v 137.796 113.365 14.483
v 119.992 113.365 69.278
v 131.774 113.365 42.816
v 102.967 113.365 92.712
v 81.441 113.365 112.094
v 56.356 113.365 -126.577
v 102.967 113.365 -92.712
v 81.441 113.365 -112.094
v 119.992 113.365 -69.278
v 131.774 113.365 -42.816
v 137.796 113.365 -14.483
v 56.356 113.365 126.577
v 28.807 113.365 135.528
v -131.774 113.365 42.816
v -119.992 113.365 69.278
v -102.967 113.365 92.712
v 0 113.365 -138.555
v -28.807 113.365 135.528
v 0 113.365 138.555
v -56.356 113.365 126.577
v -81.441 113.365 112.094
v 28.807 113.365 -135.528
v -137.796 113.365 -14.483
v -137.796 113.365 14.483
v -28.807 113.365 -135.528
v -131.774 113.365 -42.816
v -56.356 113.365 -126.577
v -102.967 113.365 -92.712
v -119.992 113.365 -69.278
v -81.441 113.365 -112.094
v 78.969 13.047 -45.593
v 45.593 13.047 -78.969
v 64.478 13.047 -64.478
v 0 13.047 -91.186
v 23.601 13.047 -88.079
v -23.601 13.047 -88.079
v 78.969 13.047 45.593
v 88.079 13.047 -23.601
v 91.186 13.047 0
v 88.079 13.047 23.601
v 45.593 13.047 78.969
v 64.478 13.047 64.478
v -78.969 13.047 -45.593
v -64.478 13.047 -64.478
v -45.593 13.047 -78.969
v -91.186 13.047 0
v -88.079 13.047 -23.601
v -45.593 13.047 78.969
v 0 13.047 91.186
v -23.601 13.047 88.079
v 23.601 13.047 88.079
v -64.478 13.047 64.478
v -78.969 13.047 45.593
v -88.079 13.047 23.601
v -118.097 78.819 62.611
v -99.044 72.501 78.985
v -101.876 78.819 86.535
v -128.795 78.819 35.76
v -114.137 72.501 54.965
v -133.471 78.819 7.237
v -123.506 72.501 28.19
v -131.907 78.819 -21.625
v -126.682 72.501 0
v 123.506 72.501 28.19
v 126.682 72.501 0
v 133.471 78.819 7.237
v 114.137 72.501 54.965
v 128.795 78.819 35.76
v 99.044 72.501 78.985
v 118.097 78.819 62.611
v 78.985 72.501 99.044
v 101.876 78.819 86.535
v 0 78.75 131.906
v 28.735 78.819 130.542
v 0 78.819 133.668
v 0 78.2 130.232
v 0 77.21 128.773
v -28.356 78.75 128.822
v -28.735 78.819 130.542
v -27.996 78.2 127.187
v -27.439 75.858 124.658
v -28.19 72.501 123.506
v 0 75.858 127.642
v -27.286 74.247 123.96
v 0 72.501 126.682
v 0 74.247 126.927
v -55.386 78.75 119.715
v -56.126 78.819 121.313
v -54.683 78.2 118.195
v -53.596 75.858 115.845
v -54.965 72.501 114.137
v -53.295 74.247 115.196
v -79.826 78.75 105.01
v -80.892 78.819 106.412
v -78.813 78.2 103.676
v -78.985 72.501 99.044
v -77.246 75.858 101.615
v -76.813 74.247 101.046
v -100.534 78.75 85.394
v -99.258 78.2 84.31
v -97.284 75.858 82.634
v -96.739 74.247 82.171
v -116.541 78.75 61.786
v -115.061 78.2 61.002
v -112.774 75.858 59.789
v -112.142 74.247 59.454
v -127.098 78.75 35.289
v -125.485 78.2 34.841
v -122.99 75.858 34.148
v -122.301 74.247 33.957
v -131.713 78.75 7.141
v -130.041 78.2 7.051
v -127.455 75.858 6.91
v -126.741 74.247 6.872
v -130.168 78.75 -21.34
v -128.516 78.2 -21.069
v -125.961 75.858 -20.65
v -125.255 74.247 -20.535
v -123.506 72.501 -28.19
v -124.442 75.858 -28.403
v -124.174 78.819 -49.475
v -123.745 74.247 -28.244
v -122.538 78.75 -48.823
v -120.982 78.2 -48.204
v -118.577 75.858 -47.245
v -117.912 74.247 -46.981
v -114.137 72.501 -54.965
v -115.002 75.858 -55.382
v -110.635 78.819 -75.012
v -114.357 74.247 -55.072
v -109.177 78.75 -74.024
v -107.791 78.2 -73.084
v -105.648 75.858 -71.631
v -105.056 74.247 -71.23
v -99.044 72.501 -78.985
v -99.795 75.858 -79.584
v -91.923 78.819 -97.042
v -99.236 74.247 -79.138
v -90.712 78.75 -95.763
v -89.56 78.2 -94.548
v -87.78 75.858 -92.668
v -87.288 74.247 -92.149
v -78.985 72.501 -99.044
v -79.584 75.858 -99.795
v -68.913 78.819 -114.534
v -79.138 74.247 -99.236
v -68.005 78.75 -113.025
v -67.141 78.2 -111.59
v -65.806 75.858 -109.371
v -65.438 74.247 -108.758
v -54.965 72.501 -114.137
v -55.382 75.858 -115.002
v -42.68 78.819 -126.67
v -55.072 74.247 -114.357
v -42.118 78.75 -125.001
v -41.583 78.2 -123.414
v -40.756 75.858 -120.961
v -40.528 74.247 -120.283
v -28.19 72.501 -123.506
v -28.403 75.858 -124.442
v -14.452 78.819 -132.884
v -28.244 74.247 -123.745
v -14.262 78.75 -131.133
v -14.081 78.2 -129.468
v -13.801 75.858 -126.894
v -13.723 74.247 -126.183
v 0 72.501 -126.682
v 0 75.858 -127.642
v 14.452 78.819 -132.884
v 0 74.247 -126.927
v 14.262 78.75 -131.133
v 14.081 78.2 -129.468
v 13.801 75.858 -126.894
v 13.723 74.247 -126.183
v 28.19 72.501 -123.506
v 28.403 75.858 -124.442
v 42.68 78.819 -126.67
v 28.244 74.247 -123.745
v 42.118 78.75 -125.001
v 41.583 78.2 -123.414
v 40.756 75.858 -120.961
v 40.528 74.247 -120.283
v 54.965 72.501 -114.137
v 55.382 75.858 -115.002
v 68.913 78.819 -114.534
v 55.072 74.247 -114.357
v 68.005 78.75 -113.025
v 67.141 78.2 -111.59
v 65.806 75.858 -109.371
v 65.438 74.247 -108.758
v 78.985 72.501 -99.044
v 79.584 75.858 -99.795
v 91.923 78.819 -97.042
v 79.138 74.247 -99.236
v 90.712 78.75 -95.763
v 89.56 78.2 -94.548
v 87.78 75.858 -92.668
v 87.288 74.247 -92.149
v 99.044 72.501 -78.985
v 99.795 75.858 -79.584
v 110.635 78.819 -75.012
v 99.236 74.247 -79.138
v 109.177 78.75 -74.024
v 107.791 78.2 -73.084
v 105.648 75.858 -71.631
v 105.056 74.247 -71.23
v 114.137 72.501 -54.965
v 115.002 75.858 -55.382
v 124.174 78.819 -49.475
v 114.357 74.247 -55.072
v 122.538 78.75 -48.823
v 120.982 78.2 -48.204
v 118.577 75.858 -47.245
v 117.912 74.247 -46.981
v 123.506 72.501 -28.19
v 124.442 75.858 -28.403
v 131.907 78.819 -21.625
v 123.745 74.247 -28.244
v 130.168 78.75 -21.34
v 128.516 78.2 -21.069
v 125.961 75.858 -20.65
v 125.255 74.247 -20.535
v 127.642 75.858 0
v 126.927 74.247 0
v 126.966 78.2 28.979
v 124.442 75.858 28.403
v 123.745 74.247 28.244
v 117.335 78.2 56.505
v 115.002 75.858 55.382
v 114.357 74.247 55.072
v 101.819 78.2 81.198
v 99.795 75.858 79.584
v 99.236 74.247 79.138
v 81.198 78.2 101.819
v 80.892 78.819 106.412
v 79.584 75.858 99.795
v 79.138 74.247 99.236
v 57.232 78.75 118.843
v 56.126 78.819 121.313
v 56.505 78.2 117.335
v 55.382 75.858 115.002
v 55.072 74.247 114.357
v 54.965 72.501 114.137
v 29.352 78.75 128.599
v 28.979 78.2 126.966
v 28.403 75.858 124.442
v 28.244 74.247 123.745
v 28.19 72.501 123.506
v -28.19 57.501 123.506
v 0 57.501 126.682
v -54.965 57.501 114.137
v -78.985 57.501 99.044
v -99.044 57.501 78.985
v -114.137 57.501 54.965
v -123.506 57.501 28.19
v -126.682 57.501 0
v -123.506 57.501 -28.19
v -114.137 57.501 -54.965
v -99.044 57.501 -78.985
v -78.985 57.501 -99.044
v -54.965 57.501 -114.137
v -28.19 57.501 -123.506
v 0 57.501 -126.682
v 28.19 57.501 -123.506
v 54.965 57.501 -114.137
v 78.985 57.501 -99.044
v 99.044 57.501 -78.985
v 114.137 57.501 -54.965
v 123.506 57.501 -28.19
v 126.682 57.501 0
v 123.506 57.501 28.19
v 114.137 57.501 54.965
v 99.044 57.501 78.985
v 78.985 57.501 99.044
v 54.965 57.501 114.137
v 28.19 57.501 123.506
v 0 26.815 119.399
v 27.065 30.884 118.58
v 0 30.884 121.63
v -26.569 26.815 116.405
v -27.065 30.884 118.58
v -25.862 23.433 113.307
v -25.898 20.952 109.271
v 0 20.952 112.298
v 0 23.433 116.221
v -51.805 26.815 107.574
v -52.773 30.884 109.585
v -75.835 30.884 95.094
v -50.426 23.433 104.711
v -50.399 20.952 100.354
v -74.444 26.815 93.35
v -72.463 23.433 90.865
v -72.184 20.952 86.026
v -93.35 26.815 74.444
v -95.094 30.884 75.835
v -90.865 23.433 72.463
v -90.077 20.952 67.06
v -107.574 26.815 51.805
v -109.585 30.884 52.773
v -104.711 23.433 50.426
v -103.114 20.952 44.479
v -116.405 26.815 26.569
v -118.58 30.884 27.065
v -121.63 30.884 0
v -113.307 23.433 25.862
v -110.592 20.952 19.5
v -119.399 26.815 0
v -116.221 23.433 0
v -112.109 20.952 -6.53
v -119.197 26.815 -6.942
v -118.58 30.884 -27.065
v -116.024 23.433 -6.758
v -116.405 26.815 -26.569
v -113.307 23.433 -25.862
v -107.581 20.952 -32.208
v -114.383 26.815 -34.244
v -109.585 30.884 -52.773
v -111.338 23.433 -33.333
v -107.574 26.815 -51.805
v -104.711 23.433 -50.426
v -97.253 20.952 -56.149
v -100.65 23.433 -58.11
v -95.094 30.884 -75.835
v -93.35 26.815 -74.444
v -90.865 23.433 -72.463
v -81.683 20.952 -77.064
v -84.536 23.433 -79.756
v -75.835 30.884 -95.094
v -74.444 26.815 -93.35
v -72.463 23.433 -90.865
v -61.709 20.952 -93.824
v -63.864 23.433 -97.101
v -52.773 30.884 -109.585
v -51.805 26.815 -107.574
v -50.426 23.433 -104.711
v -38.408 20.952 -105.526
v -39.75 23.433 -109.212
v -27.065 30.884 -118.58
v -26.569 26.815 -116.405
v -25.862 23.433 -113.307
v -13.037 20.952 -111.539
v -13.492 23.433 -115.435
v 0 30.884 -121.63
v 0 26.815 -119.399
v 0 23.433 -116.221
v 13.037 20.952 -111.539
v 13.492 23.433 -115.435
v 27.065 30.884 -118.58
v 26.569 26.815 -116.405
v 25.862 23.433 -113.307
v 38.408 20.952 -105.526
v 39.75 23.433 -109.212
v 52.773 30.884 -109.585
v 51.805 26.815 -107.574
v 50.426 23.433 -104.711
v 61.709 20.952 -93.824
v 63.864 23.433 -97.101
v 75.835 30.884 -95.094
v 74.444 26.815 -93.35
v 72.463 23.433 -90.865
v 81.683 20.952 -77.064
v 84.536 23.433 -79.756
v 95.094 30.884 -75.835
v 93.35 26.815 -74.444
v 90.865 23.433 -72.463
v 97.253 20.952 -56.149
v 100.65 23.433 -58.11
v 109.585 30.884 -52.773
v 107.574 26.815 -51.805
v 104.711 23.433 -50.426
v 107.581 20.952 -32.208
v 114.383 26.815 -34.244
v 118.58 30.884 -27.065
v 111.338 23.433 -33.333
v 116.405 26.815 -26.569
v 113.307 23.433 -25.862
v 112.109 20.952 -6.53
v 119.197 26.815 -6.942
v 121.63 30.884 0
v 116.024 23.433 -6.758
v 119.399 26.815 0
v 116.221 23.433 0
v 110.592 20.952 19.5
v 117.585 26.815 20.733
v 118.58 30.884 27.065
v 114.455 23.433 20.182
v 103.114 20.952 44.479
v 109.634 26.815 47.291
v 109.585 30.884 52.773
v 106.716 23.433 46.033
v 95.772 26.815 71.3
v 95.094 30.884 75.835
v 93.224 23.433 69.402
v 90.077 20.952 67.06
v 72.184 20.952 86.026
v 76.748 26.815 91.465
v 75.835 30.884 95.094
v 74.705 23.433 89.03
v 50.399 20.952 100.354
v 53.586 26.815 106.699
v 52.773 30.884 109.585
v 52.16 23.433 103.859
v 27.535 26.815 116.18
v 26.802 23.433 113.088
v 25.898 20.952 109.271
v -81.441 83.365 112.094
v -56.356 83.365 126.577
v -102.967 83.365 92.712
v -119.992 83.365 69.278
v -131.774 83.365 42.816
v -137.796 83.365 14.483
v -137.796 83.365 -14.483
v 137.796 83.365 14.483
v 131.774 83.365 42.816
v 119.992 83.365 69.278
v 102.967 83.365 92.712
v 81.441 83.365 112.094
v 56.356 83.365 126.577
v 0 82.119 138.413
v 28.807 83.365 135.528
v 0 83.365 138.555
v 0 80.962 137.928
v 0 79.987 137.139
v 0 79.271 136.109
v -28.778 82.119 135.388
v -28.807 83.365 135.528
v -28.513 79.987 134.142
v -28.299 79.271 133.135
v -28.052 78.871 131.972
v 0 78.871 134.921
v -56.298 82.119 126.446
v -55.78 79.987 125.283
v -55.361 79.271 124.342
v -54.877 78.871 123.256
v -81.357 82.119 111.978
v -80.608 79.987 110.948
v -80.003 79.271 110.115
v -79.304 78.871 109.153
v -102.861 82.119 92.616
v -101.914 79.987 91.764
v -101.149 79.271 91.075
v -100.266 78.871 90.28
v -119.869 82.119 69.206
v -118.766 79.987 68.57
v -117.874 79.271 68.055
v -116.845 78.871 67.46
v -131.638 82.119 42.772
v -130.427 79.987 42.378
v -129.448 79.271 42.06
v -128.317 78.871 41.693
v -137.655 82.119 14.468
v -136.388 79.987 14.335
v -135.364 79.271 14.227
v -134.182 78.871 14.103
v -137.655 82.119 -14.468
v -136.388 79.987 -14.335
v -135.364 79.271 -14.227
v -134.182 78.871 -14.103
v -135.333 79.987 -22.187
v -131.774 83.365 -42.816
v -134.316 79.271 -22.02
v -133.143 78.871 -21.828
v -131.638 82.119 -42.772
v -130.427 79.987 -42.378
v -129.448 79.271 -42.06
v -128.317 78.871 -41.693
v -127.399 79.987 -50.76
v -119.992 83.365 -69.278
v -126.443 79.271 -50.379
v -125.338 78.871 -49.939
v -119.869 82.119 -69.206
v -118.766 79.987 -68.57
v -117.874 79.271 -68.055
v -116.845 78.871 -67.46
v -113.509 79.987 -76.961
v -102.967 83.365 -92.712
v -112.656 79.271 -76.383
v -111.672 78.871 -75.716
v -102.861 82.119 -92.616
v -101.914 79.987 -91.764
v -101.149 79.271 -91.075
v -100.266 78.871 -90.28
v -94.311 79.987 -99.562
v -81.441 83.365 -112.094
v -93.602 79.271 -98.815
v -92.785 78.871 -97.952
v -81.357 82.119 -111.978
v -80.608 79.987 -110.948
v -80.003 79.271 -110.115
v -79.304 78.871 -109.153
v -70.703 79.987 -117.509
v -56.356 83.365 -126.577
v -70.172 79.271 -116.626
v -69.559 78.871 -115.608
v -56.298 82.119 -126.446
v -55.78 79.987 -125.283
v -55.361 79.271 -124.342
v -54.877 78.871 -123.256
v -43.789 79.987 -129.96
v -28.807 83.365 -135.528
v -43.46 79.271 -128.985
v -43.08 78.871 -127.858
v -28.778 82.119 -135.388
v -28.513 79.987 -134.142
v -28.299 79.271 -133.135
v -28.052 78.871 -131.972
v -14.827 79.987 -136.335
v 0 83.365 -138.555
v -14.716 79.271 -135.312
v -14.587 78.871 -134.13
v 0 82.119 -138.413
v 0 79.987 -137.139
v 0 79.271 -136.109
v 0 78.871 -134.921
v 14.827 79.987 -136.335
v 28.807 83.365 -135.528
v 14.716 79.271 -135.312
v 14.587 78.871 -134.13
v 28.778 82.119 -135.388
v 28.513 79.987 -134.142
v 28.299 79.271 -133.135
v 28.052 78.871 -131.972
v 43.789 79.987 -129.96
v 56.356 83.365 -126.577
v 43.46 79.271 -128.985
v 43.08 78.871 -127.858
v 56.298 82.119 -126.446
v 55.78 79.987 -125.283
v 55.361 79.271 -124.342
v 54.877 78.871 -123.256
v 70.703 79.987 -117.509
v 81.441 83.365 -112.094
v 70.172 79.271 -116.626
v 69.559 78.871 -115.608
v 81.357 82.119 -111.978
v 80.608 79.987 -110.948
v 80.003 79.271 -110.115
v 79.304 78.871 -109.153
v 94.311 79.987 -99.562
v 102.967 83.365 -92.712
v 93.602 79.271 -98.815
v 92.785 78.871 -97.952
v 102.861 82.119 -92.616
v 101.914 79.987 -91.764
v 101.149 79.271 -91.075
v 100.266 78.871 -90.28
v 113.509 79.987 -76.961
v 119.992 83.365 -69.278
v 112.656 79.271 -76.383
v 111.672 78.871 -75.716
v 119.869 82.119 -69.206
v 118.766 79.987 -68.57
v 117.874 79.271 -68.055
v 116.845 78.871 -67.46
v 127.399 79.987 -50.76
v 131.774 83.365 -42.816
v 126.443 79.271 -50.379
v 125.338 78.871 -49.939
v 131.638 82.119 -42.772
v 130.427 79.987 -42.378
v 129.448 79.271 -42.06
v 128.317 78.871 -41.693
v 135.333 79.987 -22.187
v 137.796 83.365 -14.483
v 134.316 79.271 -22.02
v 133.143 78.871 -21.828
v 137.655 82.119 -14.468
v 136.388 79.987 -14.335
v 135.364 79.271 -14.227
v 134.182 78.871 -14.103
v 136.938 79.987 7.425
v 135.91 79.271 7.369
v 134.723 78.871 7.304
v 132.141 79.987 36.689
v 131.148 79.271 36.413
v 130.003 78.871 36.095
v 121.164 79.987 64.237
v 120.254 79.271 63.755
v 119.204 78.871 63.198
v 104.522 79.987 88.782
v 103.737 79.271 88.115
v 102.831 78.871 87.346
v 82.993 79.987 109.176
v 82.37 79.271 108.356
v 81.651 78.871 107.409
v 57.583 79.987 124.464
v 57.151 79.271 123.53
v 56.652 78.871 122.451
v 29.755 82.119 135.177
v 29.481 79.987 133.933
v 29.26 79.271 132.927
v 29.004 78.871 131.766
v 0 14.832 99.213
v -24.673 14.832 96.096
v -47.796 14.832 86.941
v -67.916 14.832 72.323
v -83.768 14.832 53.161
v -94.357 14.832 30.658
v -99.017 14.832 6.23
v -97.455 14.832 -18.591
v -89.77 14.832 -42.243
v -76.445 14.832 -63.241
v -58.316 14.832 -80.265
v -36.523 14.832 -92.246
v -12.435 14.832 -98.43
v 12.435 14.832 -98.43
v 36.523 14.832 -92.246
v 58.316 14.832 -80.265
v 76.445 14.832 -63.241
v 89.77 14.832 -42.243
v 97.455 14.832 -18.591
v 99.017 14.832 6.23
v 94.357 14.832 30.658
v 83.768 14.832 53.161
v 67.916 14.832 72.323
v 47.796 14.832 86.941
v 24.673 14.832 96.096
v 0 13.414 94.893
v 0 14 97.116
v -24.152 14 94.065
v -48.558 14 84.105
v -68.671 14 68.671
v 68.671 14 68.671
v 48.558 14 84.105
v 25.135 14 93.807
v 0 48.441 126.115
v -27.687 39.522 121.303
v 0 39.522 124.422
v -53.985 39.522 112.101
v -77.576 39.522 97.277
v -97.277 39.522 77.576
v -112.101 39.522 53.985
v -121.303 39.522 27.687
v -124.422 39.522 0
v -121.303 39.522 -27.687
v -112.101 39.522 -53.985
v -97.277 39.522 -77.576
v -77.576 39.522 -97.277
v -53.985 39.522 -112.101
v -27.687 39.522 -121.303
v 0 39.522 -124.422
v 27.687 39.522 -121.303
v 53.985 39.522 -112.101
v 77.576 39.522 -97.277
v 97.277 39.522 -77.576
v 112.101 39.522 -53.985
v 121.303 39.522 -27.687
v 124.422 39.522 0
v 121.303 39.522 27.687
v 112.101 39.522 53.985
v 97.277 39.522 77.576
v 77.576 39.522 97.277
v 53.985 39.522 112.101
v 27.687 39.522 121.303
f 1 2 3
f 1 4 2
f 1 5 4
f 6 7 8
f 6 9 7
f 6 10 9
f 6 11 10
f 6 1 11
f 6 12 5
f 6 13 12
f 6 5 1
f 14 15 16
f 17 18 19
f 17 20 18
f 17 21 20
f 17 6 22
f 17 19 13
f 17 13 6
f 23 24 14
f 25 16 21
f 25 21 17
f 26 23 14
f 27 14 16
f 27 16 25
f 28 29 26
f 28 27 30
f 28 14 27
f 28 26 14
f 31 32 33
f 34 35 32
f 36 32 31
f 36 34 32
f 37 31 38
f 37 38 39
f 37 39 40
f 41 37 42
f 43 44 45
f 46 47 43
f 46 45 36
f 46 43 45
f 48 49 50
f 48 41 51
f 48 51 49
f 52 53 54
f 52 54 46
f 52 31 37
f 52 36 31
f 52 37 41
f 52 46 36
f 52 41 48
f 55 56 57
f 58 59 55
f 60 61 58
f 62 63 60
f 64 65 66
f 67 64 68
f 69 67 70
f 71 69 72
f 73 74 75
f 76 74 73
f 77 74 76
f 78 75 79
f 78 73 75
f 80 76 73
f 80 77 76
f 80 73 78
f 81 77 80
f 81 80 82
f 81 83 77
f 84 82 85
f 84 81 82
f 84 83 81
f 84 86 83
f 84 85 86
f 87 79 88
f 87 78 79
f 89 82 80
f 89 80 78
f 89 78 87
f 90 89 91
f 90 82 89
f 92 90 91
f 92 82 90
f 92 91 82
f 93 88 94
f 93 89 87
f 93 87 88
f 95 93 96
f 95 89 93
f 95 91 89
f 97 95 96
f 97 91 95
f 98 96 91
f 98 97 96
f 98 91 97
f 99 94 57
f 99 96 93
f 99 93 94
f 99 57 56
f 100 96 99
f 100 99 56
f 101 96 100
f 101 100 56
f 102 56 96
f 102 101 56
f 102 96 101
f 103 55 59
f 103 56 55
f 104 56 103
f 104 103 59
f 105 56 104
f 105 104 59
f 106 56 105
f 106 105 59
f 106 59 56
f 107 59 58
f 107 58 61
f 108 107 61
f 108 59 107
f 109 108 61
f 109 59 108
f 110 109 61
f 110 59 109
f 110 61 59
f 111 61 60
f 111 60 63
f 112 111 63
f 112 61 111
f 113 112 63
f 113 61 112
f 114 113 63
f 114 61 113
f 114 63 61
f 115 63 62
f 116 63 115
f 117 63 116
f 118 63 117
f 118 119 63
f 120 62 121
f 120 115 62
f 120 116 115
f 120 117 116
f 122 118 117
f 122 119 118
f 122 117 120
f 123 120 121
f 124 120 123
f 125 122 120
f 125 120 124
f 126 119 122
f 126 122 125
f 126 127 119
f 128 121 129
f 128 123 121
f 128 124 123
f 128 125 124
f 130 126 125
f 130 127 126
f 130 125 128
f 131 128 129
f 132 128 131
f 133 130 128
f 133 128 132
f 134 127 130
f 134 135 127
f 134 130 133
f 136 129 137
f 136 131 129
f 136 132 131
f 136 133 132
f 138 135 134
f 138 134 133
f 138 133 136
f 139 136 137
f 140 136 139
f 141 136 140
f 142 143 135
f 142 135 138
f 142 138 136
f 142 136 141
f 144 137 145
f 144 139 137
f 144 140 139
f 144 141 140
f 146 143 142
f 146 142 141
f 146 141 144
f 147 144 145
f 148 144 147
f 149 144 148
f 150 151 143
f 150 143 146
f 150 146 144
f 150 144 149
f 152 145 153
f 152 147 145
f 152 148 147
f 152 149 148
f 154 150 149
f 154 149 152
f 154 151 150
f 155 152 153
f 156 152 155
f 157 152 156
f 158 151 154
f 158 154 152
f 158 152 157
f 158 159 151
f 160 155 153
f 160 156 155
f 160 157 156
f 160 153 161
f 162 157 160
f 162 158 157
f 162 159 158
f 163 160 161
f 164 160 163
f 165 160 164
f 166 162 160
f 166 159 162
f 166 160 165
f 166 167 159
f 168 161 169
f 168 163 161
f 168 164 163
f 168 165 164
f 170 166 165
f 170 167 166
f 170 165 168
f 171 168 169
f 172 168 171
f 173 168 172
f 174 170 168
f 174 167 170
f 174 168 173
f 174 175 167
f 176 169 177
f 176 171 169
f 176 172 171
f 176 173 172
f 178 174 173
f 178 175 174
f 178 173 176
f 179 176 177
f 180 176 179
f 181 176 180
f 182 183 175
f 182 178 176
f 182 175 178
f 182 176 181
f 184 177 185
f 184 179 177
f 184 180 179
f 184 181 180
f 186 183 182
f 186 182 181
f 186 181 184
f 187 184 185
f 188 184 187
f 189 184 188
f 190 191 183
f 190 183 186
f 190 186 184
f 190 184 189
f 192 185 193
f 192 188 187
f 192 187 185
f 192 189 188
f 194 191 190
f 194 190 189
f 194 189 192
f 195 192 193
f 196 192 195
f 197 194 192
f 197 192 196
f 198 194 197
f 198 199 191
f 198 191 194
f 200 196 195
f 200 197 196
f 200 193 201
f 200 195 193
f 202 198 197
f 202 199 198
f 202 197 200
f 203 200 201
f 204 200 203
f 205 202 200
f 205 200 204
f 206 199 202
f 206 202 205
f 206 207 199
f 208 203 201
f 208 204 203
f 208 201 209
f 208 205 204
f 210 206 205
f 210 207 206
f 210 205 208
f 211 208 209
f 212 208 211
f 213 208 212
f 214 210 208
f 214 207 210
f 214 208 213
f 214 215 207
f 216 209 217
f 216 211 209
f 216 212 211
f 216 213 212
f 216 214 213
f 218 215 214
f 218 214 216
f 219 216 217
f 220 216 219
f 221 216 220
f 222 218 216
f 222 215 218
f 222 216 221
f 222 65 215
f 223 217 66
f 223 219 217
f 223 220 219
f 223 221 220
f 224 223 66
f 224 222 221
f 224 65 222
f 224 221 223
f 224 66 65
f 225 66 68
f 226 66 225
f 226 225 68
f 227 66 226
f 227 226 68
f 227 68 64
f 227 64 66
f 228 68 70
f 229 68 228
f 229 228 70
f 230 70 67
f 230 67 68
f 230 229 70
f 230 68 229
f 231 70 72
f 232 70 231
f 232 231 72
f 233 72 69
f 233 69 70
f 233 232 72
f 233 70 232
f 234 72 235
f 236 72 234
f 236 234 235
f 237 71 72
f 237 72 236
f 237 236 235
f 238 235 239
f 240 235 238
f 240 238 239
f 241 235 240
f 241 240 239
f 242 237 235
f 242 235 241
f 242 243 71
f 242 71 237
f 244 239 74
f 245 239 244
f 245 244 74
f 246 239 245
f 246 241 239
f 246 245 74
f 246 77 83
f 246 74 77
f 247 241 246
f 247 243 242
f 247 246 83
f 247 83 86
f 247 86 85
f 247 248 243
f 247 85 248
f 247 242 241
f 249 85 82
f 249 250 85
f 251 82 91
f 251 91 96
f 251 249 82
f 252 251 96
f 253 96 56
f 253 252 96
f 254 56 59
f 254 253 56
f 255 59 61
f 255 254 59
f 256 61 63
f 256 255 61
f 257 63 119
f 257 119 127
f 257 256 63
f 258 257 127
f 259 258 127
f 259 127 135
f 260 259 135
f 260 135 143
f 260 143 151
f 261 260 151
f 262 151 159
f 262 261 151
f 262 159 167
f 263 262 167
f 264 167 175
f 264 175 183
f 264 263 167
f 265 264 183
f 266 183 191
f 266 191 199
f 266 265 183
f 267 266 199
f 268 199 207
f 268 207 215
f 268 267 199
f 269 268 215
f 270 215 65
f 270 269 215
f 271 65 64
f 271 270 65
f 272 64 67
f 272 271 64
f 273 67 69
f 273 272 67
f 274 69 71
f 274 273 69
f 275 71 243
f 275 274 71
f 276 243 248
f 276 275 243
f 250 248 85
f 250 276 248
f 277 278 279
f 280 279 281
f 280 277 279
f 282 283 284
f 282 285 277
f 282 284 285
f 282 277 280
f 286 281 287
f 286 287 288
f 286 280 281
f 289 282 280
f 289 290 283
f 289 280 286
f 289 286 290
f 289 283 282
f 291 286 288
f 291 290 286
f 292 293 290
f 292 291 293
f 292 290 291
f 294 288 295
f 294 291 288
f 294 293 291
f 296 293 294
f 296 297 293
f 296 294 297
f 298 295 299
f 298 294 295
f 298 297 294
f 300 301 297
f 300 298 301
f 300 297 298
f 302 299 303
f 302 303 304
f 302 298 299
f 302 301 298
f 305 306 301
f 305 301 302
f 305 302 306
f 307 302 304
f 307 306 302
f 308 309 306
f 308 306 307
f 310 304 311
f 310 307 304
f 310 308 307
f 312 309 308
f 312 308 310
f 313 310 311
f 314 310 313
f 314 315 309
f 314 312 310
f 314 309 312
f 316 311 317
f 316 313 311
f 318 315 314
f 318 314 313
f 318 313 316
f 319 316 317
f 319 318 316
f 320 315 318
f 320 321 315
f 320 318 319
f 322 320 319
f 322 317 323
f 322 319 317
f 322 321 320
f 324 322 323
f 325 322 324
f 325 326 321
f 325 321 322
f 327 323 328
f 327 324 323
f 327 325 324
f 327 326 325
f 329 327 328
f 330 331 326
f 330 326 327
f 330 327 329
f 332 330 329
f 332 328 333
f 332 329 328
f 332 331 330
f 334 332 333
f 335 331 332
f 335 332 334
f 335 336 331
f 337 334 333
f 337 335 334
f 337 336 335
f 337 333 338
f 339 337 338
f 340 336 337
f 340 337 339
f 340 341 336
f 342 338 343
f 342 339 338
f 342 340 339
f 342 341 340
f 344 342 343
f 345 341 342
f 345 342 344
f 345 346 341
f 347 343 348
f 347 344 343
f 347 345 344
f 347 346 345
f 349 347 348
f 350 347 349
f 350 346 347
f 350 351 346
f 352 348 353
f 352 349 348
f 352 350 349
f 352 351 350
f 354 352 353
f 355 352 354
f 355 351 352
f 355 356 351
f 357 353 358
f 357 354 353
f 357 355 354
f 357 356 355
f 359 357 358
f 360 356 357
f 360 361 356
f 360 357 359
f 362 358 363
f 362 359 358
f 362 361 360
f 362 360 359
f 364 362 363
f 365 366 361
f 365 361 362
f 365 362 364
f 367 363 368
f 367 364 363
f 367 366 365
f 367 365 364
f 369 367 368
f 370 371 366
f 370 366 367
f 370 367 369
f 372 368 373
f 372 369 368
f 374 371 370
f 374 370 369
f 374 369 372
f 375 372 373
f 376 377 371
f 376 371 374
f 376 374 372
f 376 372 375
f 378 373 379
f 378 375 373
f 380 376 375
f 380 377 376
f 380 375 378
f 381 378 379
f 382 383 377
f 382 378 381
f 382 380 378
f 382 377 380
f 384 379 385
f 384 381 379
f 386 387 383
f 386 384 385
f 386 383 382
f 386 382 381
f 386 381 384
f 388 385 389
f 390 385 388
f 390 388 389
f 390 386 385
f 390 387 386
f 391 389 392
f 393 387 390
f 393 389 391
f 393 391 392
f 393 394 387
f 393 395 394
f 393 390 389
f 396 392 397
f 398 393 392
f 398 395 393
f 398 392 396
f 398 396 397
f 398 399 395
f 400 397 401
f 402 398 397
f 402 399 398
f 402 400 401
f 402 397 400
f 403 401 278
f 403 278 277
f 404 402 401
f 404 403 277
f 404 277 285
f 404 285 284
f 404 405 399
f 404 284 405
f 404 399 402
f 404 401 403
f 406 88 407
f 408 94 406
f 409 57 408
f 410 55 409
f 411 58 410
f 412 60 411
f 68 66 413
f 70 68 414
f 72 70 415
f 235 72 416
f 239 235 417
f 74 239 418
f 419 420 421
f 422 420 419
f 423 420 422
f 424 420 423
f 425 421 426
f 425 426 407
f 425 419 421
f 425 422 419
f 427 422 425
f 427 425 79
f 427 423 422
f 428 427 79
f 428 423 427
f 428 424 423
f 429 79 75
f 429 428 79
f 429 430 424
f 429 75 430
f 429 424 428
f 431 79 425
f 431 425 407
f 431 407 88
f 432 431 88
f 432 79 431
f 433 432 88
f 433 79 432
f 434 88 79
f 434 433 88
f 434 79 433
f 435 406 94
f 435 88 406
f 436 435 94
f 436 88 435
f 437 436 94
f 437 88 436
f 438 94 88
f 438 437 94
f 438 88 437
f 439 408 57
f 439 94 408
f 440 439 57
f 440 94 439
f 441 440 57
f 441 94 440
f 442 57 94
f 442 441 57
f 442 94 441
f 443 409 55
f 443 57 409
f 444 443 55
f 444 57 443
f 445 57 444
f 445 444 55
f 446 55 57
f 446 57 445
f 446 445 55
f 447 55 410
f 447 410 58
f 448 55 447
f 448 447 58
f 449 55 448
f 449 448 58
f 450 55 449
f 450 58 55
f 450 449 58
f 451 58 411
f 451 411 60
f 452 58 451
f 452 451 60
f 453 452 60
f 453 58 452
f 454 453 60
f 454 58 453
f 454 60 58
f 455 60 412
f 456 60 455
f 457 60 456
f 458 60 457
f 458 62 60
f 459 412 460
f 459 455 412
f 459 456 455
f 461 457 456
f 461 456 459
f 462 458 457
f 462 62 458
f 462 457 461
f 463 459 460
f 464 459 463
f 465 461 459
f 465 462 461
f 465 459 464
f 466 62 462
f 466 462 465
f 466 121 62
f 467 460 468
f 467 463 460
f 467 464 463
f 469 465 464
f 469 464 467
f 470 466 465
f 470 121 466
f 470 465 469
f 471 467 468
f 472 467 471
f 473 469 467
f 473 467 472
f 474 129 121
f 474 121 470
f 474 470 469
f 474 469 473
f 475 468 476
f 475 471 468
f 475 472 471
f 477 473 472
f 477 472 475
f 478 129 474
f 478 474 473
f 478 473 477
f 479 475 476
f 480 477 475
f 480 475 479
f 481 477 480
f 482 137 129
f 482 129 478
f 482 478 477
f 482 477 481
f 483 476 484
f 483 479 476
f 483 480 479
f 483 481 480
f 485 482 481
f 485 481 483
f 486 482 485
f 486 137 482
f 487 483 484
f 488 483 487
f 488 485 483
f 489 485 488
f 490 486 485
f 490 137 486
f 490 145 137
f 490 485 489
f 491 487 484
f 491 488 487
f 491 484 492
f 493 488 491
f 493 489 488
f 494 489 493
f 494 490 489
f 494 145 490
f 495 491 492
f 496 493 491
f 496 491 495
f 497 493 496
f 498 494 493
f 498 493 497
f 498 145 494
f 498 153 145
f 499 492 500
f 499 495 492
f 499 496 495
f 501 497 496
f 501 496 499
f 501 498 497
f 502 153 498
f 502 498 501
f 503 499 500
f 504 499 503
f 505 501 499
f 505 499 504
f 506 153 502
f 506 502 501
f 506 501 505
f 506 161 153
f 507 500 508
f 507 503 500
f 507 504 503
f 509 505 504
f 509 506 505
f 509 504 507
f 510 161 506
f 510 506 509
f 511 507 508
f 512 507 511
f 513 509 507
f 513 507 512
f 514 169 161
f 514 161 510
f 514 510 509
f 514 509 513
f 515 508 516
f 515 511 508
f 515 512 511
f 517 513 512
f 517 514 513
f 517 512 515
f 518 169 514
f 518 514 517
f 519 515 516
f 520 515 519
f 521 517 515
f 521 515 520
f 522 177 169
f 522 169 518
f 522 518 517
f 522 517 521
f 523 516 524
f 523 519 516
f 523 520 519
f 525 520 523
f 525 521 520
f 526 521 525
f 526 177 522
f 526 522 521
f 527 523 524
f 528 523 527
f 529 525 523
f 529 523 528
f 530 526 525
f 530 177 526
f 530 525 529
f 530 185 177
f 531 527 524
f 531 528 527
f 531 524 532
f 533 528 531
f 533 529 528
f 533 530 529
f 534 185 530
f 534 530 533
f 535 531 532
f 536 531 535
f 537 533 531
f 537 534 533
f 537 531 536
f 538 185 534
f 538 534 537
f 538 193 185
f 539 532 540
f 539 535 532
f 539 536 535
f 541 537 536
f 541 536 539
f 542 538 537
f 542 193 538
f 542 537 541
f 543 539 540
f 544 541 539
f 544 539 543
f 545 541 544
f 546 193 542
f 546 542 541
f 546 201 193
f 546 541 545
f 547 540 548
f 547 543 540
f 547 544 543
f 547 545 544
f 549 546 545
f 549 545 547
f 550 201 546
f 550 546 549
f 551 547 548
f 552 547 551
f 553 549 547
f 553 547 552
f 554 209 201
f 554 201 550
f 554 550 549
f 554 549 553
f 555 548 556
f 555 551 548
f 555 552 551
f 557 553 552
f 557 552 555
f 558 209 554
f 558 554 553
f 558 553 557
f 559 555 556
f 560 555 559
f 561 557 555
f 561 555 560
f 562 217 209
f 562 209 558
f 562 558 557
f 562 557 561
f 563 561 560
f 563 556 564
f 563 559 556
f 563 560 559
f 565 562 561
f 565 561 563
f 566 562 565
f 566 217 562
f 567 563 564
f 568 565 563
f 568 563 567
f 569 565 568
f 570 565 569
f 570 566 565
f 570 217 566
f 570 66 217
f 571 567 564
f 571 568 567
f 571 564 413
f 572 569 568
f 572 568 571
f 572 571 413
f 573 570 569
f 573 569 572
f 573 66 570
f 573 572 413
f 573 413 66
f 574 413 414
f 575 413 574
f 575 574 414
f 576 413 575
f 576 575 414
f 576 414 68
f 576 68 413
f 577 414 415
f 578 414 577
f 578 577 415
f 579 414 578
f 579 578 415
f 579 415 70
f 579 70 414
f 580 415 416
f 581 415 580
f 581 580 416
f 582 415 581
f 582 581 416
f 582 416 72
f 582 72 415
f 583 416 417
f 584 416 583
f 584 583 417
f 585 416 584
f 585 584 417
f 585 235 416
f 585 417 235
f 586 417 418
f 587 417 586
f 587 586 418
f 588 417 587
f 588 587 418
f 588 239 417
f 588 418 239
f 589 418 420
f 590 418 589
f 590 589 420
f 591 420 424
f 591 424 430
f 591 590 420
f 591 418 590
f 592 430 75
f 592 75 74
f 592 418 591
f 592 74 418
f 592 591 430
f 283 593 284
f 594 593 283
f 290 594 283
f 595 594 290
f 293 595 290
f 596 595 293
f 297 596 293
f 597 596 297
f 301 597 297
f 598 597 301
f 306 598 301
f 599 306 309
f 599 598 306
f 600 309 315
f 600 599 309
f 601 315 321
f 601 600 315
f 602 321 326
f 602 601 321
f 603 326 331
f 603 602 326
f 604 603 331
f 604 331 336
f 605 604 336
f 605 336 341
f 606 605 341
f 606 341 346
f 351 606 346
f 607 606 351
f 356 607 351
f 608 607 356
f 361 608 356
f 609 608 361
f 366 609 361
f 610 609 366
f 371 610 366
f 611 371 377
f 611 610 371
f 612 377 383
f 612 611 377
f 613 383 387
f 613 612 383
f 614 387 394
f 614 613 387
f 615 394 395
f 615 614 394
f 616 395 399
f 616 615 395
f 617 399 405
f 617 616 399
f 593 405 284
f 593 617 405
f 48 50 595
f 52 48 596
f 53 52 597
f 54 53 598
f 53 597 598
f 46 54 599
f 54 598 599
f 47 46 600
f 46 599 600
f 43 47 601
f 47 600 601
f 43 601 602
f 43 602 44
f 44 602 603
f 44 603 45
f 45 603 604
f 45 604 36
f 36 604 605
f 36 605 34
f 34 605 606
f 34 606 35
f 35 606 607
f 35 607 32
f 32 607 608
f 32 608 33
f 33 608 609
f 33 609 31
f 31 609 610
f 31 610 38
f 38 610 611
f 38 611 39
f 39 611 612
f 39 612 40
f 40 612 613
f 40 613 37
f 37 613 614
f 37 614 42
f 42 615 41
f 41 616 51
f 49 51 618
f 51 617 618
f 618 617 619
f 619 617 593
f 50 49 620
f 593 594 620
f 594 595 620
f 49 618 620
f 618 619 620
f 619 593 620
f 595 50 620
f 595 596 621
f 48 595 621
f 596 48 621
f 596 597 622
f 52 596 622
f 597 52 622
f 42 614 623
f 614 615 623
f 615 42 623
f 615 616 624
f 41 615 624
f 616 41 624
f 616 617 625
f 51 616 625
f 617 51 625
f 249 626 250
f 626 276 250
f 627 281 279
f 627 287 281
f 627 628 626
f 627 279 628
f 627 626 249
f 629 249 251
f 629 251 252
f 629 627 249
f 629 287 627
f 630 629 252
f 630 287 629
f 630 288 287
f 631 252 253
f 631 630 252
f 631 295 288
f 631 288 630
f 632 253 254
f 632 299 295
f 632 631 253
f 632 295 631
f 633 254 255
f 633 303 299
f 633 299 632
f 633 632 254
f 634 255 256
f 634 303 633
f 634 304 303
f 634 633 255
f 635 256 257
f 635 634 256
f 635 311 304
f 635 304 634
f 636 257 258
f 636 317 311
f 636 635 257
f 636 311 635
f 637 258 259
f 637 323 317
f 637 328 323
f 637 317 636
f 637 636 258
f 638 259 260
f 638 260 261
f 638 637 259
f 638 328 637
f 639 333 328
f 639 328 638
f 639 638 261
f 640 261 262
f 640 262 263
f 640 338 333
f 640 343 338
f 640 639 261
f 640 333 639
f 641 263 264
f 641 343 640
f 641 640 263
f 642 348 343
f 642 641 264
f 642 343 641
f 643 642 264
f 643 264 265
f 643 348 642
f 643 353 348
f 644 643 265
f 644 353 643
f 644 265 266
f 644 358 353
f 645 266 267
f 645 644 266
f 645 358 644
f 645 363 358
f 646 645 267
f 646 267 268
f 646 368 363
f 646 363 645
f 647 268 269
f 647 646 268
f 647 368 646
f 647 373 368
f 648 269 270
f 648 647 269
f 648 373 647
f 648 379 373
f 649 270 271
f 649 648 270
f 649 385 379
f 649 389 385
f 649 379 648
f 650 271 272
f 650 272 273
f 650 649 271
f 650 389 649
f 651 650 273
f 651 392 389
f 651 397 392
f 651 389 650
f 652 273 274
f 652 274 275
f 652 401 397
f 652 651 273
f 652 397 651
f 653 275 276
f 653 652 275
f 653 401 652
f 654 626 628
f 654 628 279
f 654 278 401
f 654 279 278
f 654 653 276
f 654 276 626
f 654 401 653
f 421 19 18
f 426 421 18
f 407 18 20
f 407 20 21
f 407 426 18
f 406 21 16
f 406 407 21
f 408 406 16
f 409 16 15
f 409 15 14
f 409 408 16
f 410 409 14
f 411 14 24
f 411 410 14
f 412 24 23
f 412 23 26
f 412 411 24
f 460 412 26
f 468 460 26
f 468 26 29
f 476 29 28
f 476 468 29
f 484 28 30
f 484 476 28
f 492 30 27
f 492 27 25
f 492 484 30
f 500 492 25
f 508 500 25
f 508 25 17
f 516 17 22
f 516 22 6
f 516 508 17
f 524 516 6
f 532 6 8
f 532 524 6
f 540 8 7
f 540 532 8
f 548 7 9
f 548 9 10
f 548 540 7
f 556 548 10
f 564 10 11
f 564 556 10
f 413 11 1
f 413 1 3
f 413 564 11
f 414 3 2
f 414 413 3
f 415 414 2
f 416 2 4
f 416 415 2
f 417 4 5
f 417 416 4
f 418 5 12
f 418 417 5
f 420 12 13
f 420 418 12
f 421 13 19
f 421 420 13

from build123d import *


with BuildPart() as part:
    # Sketch1 → Revolve1 (revolve)
    with BuildSketch(Plane(origin=(0, 0, 0), x_dir=(0, 0, -1), z_dir=(1, 0, 0))):
        with BuildLine():
            Line((-91.186, 13.047291374), (-80.264, 13.047291374))
            Line((-80.264, 13.047291374), (0, 13.047291374))
            Line((0, 13.047291374), (0, 113.365316059))
            Line((0, 113.365316059), (-138.555289406, 113.365316059))
            Line((-138.555289406, 113.365316059), (-138.555289406, 83.365316059))
            ThreePointArc((-138.555289406, 83.365316059), (-137.139237072, 79.987189383), (-133.6675, 78.819291374))
            ThreePointArc((-133.6675, 78.819291374), (-128.772790503, 77.210407188), (-126.6825, 72.501121148))
            Line((-126.6825, 72.501121148), (-126.6825, 57.501121148))
            ThreePointArc((-126.6825, 57.501121148), (-125.408162819, 43.954921466), (-121.629866106, 30.884040279))
            ThreePointArc((-121.629866106, 30.884040279), (-117.916780417, 25.02322781), (-112.298492351, 20.952482505))
            Line((-112.298492351, 20.952482505), (-99.212725253, 14.832128031))
            add(Edge.make_bspline(
                [(-91.186, 13.047291374), (-93.993075649, 13.047291374), (-96.709658085, 13.661416507), (-99.212725253, 14.832128031)],
                knots=[0, 0, 0, 0, 1, 1, 1, 1], degree=3, weights=[0.254333095, 0.254333095, 0.258499794, 0.266833191]))
        make_face()
    revolve(axis=Axis((0, 55, 0), (0, -1, 0)))


solid = part.part
